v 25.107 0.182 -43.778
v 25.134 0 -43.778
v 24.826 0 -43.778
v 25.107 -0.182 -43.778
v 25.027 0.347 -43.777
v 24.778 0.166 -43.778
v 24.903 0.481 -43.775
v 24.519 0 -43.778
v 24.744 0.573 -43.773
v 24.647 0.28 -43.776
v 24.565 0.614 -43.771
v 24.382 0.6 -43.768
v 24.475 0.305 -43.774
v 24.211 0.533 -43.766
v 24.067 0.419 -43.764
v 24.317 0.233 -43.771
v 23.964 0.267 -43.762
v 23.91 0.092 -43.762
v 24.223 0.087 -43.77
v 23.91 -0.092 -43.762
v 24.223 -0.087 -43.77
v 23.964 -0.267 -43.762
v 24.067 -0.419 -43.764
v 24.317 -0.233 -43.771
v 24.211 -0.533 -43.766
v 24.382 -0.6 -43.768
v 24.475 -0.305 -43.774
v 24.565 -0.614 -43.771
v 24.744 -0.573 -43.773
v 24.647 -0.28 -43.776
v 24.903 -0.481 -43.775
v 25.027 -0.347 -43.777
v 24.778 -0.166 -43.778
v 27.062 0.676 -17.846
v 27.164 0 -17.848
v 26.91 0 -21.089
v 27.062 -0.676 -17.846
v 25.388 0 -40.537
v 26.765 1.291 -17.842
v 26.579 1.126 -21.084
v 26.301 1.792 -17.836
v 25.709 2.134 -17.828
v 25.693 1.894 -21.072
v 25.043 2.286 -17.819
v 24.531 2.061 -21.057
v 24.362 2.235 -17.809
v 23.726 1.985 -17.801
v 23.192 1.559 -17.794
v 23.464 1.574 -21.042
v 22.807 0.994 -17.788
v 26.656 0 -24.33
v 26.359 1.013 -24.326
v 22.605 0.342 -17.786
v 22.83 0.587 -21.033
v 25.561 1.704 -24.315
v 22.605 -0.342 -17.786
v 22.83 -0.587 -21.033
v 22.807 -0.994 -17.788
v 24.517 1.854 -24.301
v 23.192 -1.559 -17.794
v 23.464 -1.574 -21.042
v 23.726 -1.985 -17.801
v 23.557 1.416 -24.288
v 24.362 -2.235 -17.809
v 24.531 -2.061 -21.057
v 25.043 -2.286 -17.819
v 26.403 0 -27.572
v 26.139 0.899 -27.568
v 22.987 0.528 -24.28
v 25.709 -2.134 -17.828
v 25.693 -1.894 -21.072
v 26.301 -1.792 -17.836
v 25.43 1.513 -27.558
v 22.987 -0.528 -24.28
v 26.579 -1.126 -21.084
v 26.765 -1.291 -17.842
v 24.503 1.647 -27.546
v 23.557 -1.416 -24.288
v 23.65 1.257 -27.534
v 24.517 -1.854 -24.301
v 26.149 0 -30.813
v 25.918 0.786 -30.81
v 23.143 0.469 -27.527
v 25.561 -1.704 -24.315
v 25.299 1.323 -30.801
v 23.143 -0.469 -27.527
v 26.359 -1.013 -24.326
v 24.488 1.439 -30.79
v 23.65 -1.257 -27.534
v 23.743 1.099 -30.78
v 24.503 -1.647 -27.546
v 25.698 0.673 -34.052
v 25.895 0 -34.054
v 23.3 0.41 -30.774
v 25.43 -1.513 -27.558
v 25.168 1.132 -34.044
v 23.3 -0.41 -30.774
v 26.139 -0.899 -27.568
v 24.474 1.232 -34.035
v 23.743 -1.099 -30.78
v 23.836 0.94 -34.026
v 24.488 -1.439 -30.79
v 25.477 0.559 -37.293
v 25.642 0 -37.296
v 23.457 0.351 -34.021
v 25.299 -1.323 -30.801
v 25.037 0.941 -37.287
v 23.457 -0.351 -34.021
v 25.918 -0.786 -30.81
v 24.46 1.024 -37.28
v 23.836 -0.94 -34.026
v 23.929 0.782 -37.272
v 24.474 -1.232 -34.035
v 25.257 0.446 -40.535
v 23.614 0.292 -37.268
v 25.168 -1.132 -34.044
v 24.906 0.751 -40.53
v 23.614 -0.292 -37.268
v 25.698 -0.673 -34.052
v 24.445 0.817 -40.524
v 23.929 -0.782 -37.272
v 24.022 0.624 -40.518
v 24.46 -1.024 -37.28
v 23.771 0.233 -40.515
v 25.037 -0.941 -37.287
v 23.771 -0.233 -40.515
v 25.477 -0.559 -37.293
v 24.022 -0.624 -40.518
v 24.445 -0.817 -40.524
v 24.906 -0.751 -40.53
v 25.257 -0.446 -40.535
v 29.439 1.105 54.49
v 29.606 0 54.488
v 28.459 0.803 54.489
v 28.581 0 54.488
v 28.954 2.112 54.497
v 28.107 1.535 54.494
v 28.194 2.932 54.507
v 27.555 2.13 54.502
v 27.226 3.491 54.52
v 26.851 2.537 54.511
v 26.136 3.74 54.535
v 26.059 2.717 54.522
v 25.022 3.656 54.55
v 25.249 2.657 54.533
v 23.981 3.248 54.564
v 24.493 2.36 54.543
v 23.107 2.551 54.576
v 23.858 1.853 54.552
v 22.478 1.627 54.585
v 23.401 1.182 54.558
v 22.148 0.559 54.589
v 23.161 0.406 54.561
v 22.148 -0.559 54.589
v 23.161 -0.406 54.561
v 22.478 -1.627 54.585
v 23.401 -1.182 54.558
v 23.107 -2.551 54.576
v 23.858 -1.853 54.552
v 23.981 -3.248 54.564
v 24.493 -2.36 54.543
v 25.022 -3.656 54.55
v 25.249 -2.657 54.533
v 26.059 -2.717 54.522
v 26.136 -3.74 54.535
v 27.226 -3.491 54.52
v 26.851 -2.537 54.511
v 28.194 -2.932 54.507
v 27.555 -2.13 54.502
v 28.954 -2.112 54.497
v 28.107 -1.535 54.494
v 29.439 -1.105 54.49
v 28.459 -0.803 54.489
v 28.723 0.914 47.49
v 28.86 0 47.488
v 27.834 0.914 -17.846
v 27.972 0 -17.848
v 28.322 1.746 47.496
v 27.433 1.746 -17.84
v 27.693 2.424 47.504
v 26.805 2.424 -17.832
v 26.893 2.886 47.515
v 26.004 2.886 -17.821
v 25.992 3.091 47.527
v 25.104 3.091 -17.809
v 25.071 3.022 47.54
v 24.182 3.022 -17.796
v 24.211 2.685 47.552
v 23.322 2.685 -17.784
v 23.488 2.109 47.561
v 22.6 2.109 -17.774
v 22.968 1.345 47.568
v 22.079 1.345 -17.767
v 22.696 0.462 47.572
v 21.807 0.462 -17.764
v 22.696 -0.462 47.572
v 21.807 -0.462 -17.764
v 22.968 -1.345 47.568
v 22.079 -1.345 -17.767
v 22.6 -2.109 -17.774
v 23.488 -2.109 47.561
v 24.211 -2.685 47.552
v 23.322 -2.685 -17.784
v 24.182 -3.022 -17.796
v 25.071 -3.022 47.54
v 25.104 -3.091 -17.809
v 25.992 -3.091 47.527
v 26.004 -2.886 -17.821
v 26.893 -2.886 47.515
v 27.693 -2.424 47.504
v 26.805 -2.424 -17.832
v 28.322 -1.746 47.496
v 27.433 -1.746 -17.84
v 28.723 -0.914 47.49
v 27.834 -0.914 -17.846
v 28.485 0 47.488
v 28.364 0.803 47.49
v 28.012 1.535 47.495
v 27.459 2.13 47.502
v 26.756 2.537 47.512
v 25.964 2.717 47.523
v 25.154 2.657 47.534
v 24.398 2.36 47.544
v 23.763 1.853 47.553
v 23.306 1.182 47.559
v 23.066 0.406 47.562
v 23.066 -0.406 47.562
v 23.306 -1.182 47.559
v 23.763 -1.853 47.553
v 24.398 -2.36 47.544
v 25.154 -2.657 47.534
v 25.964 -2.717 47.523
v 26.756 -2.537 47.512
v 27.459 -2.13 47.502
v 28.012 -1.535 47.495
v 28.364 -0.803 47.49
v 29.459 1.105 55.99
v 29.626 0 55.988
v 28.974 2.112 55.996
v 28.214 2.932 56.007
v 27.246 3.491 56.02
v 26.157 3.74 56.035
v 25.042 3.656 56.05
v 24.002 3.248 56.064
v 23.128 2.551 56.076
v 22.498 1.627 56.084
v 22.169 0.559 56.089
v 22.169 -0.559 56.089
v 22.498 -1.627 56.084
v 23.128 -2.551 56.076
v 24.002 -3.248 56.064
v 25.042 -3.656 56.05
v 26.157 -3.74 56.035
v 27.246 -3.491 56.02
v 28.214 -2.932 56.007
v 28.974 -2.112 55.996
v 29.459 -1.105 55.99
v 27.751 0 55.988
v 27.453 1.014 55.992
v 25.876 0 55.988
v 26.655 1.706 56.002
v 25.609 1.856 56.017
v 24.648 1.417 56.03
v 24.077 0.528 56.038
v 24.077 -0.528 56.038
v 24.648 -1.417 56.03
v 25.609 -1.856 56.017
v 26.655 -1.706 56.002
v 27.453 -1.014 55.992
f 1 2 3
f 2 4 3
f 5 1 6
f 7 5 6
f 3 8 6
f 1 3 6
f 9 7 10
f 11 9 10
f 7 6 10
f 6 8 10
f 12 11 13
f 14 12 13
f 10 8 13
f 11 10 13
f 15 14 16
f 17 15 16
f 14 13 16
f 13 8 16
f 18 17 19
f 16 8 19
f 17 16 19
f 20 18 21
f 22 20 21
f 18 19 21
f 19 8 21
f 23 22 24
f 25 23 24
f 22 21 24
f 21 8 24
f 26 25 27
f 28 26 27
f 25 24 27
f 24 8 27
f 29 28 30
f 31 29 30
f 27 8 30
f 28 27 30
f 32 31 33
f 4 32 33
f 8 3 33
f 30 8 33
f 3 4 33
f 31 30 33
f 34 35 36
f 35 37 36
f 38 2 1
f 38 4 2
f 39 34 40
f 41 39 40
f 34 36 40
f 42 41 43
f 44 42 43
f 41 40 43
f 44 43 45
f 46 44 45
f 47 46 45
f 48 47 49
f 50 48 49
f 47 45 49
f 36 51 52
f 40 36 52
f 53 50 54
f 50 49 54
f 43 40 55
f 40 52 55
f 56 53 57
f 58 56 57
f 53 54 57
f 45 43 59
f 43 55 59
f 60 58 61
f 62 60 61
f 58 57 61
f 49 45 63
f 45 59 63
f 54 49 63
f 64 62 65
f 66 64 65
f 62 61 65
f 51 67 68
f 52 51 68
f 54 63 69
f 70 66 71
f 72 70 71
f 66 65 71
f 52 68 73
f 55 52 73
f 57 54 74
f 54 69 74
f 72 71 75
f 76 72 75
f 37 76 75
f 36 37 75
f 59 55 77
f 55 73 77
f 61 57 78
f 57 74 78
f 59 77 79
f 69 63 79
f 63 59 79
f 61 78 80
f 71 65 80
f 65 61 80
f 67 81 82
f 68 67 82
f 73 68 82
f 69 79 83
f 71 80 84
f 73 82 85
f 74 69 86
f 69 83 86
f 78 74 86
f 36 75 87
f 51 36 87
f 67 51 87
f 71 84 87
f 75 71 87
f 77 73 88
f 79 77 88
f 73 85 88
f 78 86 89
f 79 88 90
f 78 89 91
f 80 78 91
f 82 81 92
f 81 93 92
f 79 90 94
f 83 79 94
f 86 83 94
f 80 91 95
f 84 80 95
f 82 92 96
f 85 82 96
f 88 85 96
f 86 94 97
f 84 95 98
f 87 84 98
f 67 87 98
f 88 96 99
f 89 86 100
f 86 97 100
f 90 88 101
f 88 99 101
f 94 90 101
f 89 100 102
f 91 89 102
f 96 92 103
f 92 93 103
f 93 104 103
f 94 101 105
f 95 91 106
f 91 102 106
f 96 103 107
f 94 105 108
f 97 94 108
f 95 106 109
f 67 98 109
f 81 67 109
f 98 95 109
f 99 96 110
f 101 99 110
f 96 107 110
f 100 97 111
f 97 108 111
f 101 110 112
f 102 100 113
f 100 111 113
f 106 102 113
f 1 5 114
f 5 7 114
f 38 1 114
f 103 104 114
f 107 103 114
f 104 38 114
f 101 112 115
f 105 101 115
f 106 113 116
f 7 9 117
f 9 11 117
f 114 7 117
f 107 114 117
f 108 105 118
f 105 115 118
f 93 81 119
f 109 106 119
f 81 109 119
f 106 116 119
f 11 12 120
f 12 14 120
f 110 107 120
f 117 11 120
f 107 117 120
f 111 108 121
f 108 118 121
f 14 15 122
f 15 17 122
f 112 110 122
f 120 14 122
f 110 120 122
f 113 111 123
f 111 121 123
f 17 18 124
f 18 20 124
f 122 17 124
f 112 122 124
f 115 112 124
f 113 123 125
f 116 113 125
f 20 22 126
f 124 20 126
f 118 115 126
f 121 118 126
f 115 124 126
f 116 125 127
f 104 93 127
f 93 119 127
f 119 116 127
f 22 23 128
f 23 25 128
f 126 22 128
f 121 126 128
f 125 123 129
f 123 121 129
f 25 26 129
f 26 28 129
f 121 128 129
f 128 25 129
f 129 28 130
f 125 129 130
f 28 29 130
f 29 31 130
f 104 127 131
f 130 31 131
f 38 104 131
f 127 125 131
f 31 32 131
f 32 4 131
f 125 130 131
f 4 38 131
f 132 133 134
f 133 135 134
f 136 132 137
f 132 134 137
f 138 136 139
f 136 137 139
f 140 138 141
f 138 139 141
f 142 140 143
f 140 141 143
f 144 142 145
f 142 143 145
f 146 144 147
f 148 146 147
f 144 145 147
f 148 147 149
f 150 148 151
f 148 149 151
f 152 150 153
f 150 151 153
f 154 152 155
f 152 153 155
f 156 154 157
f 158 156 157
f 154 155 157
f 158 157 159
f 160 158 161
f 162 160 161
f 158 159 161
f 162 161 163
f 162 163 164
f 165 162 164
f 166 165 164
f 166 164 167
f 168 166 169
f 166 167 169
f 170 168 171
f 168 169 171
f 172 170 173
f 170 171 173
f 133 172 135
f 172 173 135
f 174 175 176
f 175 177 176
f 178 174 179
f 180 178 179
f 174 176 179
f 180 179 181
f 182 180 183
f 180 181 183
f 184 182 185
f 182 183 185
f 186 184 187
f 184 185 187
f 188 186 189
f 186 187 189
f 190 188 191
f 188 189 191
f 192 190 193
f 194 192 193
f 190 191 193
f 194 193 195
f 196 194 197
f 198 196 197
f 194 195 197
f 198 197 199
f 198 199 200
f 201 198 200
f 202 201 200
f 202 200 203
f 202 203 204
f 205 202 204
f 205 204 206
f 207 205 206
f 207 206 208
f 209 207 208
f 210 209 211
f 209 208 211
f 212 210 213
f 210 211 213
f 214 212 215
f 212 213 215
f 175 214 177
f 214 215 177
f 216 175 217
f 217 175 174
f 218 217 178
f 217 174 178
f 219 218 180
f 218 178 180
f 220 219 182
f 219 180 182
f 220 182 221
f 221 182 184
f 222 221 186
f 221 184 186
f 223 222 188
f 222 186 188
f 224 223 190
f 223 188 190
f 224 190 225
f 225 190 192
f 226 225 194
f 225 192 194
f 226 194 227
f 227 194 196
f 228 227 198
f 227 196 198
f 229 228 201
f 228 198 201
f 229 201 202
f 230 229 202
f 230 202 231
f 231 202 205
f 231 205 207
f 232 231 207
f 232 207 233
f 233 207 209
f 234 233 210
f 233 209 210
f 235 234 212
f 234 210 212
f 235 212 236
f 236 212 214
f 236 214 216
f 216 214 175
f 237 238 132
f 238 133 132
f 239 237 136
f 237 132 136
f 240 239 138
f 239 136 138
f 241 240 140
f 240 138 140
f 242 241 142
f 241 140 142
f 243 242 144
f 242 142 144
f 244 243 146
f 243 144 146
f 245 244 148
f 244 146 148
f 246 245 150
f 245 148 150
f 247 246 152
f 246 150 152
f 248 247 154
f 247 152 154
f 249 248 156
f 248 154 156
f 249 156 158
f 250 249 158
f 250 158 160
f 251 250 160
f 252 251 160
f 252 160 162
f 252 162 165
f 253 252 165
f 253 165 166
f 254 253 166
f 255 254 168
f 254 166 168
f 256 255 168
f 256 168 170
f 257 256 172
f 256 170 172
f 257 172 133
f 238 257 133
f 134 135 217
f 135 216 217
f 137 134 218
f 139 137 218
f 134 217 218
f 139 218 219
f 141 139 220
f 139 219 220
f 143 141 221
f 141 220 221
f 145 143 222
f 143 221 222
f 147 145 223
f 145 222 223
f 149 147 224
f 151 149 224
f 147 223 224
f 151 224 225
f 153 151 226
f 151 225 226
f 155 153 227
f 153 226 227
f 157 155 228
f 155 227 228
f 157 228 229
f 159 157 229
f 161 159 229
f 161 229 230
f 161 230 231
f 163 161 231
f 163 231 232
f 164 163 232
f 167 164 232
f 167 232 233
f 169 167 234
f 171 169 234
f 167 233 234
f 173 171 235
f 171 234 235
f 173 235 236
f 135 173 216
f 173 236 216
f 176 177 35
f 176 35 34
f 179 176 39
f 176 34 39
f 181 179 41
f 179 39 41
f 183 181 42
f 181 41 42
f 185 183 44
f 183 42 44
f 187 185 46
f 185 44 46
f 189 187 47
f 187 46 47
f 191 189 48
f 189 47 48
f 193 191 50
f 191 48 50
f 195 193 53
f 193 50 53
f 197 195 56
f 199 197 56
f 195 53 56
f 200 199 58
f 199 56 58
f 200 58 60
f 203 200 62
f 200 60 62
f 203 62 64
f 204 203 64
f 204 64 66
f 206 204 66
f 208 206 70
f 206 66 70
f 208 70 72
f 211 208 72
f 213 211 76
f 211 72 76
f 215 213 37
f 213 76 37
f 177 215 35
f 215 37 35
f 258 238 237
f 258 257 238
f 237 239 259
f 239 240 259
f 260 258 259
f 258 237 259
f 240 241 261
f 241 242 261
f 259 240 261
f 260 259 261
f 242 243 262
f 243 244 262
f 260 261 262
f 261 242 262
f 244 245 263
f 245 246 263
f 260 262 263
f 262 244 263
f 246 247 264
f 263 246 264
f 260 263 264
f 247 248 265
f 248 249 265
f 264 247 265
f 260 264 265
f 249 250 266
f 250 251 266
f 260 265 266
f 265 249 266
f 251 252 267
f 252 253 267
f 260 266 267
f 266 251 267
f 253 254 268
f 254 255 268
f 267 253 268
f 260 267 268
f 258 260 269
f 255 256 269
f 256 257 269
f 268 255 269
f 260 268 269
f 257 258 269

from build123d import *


with BuildPart() as part:
    # Sketch2 → Revolve4 (revolve)
    with BuildSketch(Plane(origin=(0, 0, 0), x_dir=(1, 0, 0), z_dir=(0, 1, 0))):
        Polygon((24.882765403, 17.005709542), (25.875695003, -55.987537343), (29.626041942, -55.987537343), (29.605639279, -54.487676105), (28.580544449, -54.487676105), (28.485332021, -47.488323664), (28.860366715, -47.488323664), (27.97160056, 17.8475545), (27.163610623, 17.8475545), (25.134414226, 43.778408192), (24.518575479, 43.778408192), align=None)
    revolve(axis=Axis((24.882765403, 0, -17.005709542), (0.013601775, 0, 0.999907492)))


solid = part.part
